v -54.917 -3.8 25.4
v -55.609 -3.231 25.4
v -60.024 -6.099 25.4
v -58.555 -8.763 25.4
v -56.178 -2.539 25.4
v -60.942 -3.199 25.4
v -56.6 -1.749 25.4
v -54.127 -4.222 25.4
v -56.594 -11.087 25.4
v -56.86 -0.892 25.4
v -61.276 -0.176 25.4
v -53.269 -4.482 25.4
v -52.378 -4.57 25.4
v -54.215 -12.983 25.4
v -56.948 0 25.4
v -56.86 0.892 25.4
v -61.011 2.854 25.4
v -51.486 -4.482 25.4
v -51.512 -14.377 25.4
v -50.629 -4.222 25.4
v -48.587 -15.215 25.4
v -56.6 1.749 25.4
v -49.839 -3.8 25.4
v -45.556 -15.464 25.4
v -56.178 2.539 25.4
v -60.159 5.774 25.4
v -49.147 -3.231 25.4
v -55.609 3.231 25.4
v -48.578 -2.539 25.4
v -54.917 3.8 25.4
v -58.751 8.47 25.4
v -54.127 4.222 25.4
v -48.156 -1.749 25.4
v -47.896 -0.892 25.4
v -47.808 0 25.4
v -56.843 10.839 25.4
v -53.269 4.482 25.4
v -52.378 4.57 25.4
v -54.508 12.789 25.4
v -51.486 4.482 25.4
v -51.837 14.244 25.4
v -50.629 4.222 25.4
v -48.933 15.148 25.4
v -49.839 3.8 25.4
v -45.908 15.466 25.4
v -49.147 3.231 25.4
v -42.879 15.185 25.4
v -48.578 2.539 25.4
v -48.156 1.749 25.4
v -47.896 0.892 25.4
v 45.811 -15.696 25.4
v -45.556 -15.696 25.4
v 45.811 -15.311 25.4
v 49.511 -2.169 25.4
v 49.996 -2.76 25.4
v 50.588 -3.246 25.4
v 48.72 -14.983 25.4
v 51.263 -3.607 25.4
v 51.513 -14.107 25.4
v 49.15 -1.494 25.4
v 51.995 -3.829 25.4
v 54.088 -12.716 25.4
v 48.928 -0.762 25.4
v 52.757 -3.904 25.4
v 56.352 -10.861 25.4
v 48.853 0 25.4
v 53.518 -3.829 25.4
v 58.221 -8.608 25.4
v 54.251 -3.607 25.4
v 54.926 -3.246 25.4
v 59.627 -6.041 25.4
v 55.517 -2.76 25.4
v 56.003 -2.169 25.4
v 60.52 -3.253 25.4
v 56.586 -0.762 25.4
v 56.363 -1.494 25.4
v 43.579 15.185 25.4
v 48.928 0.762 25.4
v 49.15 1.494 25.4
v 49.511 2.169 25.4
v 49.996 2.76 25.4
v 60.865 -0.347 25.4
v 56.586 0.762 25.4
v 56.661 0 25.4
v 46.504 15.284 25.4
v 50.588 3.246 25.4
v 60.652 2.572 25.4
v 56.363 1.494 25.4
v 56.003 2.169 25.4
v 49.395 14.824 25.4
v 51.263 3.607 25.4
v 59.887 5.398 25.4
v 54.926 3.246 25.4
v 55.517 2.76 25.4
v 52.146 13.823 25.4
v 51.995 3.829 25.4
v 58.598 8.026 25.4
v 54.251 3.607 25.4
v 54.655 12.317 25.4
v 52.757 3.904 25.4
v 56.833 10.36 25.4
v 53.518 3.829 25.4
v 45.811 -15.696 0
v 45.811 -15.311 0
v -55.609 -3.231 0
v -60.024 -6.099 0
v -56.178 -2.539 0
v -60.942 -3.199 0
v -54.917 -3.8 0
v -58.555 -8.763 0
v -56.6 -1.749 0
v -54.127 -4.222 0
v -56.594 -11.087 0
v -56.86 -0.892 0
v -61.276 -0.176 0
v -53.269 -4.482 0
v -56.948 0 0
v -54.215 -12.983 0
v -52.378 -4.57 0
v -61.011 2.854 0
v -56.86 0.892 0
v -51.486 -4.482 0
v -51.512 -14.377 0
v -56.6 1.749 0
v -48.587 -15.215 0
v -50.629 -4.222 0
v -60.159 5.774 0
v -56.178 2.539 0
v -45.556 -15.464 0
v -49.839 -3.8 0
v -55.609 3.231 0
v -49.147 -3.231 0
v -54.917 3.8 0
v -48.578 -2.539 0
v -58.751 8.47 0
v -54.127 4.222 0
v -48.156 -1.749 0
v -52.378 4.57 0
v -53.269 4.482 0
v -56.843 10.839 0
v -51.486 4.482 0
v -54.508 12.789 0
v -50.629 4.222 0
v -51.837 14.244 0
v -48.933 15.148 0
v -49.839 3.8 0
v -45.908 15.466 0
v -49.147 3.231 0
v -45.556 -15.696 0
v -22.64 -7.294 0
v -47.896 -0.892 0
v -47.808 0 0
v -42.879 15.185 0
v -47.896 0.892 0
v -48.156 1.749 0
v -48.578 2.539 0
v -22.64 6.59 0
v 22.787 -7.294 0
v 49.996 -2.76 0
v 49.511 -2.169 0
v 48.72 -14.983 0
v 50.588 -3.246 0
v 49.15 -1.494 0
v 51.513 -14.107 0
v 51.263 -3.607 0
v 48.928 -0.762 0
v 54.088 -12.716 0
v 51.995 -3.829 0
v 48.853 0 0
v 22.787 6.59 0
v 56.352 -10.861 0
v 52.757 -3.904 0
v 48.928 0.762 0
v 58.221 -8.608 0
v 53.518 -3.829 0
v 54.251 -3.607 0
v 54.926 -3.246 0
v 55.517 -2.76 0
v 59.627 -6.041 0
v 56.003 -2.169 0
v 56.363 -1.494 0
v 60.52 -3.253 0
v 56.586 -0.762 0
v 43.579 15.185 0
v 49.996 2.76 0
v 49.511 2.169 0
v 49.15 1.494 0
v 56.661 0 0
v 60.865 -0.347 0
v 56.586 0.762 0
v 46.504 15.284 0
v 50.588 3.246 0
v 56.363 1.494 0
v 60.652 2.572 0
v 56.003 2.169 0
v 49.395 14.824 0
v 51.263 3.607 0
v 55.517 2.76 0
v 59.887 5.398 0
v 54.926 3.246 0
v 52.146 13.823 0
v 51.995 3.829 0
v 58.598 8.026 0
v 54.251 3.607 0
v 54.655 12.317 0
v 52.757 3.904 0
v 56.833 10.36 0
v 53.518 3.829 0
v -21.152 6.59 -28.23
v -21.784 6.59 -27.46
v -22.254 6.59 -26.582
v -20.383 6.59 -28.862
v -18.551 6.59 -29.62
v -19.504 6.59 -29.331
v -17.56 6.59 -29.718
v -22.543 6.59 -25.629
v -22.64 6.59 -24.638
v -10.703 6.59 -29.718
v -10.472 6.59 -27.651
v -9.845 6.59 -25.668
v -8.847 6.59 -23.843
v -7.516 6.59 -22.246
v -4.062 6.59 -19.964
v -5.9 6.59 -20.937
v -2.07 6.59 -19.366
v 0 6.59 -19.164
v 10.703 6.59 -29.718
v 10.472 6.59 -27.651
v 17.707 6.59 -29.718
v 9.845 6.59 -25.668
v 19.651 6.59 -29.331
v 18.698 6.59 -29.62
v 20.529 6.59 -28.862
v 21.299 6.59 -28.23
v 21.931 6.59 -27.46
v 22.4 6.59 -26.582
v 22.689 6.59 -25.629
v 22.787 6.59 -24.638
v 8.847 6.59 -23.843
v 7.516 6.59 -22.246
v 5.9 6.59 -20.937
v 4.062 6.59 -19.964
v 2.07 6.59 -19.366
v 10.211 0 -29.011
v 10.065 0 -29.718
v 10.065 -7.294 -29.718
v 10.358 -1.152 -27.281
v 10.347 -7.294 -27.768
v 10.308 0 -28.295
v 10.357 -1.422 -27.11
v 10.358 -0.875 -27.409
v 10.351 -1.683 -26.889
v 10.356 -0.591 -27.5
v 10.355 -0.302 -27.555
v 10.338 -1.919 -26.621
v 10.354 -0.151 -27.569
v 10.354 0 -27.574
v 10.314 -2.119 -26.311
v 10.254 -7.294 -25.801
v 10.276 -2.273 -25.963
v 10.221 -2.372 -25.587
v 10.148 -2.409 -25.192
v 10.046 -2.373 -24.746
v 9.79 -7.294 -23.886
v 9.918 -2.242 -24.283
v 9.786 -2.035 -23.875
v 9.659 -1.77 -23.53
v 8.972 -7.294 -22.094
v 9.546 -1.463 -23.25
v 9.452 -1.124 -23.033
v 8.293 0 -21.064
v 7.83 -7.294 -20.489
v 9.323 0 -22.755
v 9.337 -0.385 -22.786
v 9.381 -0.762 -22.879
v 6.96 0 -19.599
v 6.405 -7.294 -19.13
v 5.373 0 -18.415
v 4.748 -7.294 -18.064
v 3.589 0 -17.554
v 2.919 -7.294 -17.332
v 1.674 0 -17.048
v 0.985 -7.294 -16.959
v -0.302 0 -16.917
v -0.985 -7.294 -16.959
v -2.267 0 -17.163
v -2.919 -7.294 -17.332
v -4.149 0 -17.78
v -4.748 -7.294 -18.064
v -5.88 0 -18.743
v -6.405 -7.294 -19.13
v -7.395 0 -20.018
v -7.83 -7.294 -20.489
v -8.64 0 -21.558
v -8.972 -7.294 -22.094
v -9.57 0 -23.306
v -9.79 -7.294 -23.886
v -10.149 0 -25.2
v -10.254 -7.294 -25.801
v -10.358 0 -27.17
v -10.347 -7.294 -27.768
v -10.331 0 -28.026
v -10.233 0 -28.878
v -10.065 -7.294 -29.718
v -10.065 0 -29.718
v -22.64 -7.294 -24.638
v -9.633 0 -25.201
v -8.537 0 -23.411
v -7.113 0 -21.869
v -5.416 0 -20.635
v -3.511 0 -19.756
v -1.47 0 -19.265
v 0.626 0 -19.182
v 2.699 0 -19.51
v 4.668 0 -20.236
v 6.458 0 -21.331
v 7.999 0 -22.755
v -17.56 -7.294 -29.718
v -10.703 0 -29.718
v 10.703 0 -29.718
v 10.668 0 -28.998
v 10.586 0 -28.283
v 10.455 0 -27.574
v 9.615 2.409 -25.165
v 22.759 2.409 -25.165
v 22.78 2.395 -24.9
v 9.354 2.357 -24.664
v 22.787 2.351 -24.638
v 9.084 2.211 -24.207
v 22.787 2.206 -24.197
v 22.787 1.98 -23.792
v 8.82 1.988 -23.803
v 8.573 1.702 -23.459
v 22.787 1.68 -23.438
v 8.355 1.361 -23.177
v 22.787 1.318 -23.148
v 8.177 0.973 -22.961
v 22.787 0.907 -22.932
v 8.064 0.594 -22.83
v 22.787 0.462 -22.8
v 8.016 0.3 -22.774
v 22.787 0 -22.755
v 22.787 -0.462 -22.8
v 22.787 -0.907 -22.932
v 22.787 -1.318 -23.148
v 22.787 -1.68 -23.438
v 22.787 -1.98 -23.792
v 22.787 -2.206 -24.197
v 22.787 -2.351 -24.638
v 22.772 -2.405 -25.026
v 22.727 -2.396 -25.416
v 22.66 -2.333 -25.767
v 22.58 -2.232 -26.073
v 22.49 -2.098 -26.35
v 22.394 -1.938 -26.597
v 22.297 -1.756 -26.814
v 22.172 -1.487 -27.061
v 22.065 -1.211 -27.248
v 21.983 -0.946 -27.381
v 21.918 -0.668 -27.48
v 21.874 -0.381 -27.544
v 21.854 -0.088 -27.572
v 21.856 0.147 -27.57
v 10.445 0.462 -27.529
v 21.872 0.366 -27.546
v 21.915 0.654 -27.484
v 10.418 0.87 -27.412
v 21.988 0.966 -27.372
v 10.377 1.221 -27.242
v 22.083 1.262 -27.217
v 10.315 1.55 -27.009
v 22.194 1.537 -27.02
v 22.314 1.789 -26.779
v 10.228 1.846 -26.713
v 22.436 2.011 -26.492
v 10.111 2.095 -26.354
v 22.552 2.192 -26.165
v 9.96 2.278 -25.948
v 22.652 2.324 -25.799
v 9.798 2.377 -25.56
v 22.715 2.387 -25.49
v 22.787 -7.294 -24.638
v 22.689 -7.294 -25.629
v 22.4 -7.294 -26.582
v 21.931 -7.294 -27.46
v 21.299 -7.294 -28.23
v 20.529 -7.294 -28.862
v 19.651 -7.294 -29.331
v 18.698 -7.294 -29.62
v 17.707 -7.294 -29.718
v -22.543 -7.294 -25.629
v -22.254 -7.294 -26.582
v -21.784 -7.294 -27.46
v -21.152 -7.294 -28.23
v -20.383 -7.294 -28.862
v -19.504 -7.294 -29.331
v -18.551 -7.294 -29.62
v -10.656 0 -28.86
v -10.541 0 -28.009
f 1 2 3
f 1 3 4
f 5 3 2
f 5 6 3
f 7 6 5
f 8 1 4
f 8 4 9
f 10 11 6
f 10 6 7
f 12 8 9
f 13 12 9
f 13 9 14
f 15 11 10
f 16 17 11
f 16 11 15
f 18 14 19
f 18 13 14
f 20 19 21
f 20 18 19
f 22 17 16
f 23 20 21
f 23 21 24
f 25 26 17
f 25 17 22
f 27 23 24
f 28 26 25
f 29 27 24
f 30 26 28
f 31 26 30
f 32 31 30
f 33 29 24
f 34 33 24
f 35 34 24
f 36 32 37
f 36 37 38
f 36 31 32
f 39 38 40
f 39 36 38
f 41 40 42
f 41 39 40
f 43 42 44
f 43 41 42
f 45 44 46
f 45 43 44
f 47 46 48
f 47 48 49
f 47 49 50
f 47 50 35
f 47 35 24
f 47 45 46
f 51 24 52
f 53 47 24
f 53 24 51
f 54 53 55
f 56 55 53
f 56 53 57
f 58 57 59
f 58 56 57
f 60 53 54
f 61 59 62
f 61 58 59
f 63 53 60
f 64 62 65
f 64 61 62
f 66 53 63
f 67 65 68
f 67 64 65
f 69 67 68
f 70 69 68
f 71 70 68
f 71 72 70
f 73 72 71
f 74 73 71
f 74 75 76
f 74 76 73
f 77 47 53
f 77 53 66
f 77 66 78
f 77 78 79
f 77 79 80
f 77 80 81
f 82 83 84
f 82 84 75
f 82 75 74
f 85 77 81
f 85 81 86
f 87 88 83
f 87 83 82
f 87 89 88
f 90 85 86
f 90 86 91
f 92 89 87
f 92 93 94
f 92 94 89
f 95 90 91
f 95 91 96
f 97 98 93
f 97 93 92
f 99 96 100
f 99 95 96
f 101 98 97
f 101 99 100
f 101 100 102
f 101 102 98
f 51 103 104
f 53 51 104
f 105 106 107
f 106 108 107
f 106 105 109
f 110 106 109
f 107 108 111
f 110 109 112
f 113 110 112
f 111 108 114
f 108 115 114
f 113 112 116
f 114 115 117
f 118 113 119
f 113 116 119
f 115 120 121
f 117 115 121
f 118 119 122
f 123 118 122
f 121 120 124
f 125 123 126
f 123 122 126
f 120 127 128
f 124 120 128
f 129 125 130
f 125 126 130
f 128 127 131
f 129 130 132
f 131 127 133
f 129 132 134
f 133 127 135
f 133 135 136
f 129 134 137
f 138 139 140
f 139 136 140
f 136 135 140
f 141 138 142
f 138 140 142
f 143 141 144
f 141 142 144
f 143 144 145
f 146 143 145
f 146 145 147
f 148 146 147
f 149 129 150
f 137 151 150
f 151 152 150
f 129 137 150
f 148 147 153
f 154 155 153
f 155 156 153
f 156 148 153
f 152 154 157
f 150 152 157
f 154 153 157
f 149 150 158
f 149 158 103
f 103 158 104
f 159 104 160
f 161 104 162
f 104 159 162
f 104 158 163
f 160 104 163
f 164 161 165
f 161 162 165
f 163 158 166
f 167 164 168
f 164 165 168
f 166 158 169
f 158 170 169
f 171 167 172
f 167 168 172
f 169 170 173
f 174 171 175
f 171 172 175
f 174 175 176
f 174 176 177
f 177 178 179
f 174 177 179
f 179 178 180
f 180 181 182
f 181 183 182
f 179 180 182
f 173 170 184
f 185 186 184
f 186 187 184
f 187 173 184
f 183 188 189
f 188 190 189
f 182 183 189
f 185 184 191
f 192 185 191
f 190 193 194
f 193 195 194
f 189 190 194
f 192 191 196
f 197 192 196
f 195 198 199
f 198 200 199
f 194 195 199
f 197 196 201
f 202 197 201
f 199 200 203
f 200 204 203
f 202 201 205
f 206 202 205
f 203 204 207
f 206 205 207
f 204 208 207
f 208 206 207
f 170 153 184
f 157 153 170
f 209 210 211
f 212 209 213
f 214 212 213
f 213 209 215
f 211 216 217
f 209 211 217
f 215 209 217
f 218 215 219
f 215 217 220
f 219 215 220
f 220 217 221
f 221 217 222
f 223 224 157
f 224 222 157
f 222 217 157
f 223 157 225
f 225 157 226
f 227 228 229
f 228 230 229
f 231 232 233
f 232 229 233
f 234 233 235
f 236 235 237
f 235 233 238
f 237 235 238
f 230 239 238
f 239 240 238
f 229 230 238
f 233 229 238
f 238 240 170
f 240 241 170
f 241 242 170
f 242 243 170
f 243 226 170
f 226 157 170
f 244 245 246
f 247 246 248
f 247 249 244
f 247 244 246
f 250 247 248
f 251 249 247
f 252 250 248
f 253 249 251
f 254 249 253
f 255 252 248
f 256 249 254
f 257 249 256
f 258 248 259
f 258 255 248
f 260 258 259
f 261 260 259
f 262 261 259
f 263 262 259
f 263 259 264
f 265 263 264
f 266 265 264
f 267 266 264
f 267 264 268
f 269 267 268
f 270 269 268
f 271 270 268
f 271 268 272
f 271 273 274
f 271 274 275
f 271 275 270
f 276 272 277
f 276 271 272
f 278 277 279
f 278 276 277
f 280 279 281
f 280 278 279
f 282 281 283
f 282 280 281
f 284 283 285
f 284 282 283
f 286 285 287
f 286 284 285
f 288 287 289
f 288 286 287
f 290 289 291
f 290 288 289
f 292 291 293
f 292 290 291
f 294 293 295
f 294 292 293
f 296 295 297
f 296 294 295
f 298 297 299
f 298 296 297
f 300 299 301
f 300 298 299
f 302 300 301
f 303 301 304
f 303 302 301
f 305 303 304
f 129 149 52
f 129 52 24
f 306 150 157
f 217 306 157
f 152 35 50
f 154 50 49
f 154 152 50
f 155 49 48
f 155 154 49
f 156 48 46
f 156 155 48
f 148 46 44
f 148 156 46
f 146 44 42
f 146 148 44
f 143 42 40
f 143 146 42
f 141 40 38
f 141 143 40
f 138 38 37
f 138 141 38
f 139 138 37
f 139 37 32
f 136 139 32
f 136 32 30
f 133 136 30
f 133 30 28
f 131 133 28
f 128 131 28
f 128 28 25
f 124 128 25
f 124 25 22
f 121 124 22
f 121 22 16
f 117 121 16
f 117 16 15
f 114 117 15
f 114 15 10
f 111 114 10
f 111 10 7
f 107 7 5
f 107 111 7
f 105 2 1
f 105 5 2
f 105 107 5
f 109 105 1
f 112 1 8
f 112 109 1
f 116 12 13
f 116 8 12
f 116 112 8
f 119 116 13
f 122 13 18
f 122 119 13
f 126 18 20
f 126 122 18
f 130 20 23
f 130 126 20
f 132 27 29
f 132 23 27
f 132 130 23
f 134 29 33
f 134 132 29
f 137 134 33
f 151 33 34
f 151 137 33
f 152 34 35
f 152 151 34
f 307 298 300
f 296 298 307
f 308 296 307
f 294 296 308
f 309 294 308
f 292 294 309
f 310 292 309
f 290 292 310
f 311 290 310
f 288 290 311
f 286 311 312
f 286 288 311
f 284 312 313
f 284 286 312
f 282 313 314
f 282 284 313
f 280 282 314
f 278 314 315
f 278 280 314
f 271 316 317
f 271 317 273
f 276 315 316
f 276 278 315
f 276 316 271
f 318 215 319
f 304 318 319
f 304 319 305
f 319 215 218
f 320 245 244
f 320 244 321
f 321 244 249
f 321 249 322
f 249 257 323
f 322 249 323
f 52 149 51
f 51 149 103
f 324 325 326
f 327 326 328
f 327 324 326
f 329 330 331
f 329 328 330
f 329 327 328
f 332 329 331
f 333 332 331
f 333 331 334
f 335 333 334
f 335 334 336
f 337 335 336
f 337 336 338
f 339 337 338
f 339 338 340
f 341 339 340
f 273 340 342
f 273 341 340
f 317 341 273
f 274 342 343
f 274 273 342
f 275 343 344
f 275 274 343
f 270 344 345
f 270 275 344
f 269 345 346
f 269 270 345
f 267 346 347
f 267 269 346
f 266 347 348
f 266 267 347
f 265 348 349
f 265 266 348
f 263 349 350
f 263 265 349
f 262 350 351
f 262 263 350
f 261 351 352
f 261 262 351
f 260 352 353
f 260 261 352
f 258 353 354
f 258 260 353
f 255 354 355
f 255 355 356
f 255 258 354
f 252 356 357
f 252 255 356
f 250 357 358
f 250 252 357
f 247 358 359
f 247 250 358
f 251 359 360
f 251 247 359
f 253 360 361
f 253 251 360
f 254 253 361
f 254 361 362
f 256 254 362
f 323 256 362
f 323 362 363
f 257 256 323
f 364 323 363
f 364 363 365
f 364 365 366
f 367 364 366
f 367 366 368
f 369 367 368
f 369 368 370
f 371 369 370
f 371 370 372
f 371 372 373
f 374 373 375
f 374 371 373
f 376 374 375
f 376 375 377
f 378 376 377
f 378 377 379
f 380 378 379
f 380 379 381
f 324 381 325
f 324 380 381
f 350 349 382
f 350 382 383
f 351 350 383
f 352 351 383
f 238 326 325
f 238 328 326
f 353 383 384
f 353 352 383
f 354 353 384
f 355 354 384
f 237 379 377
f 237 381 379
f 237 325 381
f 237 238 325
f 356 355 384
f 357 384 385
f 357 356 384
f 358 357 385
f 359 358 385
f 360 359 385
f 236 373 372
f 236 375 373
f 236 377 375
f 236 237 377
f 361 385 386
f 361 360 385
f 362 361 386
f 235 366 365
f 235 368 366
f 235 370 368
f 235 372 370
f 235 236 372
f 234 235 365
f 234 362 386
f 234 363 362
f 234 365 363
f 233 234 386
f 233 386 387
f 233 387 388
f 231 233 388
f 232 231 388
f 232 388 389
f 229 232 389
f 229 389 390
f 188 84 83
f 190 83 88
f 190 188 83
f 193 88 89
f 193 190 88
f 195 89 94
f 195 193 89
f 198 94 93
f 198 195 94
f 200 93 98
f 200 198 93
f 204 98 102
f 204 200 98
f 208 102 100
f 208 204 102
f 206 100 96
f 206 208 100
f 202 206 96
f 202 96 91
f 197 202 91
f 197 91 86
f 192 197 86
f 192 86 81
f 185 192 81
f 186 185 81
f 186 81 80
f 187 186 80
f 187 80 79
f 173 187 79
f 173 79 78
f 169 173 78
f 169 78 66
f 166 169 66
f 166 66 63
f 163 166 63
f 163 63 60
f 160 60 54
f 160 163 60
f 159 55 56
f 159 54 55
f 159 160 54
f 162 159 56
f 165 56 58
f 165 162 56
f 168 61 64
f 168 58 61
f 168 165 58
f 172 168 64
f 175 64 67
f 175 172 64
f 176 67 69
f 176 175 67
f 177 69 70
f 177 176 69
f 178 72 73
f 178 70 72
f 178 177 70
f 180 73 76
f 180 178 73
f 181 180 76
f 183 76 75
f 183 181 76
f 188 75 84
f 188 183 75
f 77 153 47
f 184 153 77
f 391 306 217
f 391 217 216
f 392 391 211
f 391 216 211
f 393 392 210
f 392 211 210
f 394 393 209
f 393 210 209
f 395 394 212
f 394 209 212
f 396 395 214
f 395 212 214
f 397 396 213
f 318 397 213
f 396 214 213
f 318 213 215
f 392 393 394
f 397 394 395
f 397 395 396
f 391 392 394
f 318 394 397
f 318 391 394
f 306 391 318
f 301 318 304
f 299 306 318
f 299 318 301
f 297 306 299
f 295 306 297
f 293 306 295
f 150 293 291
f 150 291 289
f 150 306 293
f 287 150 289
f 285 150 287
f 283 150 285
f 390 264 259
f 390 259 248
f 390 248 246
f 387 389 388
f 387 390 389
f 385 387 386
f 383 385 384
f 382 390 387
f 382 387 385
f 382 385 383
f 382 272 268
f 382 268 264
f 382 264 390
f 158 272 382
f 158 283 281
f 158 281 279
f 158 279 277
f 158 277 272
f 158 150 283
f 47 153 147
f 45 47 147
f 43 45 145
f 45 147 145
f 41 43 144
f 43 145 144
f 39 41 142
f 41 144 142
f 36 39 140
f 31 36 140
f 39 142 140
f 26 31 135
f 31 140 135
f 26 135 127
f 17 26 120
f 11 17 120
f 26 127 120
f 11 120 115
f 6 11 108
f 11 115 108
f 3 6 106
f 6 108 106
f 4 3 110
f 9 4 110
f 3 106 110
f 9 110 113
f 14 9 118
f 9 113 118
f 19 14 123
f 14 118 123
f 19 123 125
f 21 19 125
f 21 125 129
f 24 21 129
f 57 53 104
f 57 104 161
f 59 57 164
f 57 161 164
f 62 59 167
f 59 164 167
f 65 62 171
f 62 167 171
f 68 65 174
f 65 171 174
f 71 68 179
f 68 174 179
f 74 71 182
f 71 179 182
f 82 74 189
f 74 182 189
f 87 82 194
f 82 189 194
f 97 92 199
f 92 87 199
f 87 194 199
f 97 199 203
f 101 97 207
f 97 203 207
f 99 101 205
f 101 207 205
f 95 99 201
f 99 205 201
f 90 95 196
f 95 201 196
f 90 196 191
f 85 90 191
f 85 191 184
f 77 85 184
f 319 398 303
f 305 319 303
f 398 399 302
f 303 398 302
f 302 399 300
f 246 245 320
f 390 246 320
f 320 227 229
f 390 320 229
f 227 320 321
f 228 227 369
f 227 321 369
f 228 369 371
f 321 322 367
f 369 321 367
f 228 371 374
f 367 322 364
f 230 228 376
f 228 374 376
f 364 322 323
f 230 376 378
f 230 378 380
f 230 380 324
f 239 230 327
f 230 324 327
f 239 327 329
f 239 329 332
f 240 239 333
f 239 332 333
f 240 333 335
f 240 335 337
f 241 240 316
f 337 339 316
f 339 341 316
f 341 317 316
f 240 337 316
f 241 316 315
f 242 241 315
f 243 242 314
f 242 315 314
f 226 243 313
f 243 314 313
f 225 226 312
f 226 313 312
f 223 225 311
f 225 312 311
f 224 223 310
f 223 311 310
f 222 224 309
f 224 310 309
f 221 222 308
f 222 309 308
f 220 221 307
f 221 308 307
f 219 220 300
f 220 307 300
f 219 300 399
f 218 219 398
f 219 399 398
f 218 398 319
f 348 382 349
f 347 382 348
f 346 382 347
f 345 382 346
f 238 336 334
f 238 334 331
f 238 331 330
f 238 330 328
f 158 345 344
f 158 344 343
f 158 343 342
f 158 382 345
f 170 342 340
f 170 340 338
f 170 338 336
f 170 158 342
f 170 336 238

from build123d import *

# Parameters (mm, degrees)
F1_R         = 15.4658150948
F3_DEPTH     = 25.4
F0_W         = 91.367084533
F0_H         = 30.8810528368
F4_DEPTH     = 25.4
F2_R         = 15.313452945
F5_DEPTH     = 25.4
F6_R         = 3.9725855112
F7_DEPTH     = 25.4
F8_R         = 4.5697295071
F9_DEPTH     = 26.67
F10_R        = 3.9038322972
F11_DEPTH    = 30.988
F12_W        = 45.4270541668
F12_H        = 13.8839902356
F13_DEPTH    = 29.718
F15_R        = 10.7036365959
F16_DEPTH    = 25.4
F17_R        = 10.3585042146
F18_DEPTH    = 46.736
F14_R        = 2.4093664871
F19_DEPTH    = 44.196
F20_R        = 5.08
F21_T1_DEPTH = 39.2839902356


# Not quite as in the source:
# - a fillet or chamfer that OpenCascade refuses, or shapes differently, is made with other operations: its cross-section is extruded or revolved along the edge and cut away or added


with BuildPart() as f3:
    # F1 (on Top) → F3 (new body)
    with BuildSketch(Plane.XY):
        with Locations((-45.811150223, 0)):
            Circle(F1_R)
    extrude(amount=F3_DEPTH)

    # F0 (on Top) → F4 (join)
    with BuildSketch(Plane.XY):
        with Locations((0.1276079565, -0.2552149817)):
            Rectangle(F0_W, F0_H)
    extrude(amount=F4_DEPTH)

    # F2 (on Top) → F5 (join)
    with BuildSketch(Plane.XY):
        with Locations((45.55593431, 0)):
            Circle(F2_R)
    extrude(amount=F5_DEPTH)

    # F6 (on Top) → F7 (cut)
    with BuildSketch(Plane.XY):
        with Locations((-53.0294403434, 0)):
            Circle(F6_R)
    extrude(amount=-F7_DEPTH, mode=Mode.SUBTRACT)

    # F8 (on Top) → F9 (cut)
    with BuildSketch(Plane.XY):
        with Locations((-52.3779653013, 0)):
            Circle(F8_R)
    extrude(amount=F9_DEPTH, mode=Mode.SUBTRACT)

    # F10 (on Top) → F11 (cut)
    with BuildSketch(Plane.XY):
        with Locations((52.7567230165, 0)):
            Circle(F10_R)
    extrude(amount=F11_DEPTH, mode=Mode.SUBTRACT)

    # F12 (on Top) → F13 (join)
    with BuildSketch(Plane.XY):
        with Locations((0.0732727349, -0.3520357423)):
            Rectangle(F12_W, F12_H)
    extrude(amount=-F13_DEPTH)

    # F15 (on Front) → F16 (cut)
    with BuildSketch(Plane.XZ):
        with Locations((0, -29.8675838858)):
            Circle(F15_R)
    extrude(amount=-F16_DEPTH, mode=Mode.SUBTRACT)

    # F17 (on Front) → F18 (cut)
    with BuildSketch(Plane.XZ):
        with Locations((0, -27.270803228)):
            Circle(F17_R)
    extrude(amount=F18_DEPTH, mode=Mode.SUBTRACT)

    # F14 (on Right) → F19 (cut)
    with BuildSketch(Plane.YZ):
        with Locations((0, -25.1646973193)):
            Circle(F14_R)
    extrude(amount=F19_DEPTH, mode=Mode.SUBTRACT)

    # F20
    f20_edges = [f3.edges().sort_by_distance(p)[0] for p in [
        (-22.640254, -0.352036, -29.718),
    ]]
    fillet(f20_edges, radius=F20_R)

    # F21: fillet of radius 5.08 on 1 edges, made by hand

    # F21_s2 → F21_t1 (cut)
    with BuildSketch(Plane.XZ.offset(-19.2899593756)):
        with BuildLine():
            ThreePointArc((22.7867998183, -24.638), (21.2989022667, -28.2301024484), (17.7067998183, -29.718))
            Line((17.7067998183, -29.718), (22.7867998183, -29.718))
            Line((22.7867998183, -29.718), (22.7867998183, -24.638))
        make_face()
    extrude(amount=F21_T1_DEPTH, mode=Mode.SUBTRACT)


solid = f3.part
